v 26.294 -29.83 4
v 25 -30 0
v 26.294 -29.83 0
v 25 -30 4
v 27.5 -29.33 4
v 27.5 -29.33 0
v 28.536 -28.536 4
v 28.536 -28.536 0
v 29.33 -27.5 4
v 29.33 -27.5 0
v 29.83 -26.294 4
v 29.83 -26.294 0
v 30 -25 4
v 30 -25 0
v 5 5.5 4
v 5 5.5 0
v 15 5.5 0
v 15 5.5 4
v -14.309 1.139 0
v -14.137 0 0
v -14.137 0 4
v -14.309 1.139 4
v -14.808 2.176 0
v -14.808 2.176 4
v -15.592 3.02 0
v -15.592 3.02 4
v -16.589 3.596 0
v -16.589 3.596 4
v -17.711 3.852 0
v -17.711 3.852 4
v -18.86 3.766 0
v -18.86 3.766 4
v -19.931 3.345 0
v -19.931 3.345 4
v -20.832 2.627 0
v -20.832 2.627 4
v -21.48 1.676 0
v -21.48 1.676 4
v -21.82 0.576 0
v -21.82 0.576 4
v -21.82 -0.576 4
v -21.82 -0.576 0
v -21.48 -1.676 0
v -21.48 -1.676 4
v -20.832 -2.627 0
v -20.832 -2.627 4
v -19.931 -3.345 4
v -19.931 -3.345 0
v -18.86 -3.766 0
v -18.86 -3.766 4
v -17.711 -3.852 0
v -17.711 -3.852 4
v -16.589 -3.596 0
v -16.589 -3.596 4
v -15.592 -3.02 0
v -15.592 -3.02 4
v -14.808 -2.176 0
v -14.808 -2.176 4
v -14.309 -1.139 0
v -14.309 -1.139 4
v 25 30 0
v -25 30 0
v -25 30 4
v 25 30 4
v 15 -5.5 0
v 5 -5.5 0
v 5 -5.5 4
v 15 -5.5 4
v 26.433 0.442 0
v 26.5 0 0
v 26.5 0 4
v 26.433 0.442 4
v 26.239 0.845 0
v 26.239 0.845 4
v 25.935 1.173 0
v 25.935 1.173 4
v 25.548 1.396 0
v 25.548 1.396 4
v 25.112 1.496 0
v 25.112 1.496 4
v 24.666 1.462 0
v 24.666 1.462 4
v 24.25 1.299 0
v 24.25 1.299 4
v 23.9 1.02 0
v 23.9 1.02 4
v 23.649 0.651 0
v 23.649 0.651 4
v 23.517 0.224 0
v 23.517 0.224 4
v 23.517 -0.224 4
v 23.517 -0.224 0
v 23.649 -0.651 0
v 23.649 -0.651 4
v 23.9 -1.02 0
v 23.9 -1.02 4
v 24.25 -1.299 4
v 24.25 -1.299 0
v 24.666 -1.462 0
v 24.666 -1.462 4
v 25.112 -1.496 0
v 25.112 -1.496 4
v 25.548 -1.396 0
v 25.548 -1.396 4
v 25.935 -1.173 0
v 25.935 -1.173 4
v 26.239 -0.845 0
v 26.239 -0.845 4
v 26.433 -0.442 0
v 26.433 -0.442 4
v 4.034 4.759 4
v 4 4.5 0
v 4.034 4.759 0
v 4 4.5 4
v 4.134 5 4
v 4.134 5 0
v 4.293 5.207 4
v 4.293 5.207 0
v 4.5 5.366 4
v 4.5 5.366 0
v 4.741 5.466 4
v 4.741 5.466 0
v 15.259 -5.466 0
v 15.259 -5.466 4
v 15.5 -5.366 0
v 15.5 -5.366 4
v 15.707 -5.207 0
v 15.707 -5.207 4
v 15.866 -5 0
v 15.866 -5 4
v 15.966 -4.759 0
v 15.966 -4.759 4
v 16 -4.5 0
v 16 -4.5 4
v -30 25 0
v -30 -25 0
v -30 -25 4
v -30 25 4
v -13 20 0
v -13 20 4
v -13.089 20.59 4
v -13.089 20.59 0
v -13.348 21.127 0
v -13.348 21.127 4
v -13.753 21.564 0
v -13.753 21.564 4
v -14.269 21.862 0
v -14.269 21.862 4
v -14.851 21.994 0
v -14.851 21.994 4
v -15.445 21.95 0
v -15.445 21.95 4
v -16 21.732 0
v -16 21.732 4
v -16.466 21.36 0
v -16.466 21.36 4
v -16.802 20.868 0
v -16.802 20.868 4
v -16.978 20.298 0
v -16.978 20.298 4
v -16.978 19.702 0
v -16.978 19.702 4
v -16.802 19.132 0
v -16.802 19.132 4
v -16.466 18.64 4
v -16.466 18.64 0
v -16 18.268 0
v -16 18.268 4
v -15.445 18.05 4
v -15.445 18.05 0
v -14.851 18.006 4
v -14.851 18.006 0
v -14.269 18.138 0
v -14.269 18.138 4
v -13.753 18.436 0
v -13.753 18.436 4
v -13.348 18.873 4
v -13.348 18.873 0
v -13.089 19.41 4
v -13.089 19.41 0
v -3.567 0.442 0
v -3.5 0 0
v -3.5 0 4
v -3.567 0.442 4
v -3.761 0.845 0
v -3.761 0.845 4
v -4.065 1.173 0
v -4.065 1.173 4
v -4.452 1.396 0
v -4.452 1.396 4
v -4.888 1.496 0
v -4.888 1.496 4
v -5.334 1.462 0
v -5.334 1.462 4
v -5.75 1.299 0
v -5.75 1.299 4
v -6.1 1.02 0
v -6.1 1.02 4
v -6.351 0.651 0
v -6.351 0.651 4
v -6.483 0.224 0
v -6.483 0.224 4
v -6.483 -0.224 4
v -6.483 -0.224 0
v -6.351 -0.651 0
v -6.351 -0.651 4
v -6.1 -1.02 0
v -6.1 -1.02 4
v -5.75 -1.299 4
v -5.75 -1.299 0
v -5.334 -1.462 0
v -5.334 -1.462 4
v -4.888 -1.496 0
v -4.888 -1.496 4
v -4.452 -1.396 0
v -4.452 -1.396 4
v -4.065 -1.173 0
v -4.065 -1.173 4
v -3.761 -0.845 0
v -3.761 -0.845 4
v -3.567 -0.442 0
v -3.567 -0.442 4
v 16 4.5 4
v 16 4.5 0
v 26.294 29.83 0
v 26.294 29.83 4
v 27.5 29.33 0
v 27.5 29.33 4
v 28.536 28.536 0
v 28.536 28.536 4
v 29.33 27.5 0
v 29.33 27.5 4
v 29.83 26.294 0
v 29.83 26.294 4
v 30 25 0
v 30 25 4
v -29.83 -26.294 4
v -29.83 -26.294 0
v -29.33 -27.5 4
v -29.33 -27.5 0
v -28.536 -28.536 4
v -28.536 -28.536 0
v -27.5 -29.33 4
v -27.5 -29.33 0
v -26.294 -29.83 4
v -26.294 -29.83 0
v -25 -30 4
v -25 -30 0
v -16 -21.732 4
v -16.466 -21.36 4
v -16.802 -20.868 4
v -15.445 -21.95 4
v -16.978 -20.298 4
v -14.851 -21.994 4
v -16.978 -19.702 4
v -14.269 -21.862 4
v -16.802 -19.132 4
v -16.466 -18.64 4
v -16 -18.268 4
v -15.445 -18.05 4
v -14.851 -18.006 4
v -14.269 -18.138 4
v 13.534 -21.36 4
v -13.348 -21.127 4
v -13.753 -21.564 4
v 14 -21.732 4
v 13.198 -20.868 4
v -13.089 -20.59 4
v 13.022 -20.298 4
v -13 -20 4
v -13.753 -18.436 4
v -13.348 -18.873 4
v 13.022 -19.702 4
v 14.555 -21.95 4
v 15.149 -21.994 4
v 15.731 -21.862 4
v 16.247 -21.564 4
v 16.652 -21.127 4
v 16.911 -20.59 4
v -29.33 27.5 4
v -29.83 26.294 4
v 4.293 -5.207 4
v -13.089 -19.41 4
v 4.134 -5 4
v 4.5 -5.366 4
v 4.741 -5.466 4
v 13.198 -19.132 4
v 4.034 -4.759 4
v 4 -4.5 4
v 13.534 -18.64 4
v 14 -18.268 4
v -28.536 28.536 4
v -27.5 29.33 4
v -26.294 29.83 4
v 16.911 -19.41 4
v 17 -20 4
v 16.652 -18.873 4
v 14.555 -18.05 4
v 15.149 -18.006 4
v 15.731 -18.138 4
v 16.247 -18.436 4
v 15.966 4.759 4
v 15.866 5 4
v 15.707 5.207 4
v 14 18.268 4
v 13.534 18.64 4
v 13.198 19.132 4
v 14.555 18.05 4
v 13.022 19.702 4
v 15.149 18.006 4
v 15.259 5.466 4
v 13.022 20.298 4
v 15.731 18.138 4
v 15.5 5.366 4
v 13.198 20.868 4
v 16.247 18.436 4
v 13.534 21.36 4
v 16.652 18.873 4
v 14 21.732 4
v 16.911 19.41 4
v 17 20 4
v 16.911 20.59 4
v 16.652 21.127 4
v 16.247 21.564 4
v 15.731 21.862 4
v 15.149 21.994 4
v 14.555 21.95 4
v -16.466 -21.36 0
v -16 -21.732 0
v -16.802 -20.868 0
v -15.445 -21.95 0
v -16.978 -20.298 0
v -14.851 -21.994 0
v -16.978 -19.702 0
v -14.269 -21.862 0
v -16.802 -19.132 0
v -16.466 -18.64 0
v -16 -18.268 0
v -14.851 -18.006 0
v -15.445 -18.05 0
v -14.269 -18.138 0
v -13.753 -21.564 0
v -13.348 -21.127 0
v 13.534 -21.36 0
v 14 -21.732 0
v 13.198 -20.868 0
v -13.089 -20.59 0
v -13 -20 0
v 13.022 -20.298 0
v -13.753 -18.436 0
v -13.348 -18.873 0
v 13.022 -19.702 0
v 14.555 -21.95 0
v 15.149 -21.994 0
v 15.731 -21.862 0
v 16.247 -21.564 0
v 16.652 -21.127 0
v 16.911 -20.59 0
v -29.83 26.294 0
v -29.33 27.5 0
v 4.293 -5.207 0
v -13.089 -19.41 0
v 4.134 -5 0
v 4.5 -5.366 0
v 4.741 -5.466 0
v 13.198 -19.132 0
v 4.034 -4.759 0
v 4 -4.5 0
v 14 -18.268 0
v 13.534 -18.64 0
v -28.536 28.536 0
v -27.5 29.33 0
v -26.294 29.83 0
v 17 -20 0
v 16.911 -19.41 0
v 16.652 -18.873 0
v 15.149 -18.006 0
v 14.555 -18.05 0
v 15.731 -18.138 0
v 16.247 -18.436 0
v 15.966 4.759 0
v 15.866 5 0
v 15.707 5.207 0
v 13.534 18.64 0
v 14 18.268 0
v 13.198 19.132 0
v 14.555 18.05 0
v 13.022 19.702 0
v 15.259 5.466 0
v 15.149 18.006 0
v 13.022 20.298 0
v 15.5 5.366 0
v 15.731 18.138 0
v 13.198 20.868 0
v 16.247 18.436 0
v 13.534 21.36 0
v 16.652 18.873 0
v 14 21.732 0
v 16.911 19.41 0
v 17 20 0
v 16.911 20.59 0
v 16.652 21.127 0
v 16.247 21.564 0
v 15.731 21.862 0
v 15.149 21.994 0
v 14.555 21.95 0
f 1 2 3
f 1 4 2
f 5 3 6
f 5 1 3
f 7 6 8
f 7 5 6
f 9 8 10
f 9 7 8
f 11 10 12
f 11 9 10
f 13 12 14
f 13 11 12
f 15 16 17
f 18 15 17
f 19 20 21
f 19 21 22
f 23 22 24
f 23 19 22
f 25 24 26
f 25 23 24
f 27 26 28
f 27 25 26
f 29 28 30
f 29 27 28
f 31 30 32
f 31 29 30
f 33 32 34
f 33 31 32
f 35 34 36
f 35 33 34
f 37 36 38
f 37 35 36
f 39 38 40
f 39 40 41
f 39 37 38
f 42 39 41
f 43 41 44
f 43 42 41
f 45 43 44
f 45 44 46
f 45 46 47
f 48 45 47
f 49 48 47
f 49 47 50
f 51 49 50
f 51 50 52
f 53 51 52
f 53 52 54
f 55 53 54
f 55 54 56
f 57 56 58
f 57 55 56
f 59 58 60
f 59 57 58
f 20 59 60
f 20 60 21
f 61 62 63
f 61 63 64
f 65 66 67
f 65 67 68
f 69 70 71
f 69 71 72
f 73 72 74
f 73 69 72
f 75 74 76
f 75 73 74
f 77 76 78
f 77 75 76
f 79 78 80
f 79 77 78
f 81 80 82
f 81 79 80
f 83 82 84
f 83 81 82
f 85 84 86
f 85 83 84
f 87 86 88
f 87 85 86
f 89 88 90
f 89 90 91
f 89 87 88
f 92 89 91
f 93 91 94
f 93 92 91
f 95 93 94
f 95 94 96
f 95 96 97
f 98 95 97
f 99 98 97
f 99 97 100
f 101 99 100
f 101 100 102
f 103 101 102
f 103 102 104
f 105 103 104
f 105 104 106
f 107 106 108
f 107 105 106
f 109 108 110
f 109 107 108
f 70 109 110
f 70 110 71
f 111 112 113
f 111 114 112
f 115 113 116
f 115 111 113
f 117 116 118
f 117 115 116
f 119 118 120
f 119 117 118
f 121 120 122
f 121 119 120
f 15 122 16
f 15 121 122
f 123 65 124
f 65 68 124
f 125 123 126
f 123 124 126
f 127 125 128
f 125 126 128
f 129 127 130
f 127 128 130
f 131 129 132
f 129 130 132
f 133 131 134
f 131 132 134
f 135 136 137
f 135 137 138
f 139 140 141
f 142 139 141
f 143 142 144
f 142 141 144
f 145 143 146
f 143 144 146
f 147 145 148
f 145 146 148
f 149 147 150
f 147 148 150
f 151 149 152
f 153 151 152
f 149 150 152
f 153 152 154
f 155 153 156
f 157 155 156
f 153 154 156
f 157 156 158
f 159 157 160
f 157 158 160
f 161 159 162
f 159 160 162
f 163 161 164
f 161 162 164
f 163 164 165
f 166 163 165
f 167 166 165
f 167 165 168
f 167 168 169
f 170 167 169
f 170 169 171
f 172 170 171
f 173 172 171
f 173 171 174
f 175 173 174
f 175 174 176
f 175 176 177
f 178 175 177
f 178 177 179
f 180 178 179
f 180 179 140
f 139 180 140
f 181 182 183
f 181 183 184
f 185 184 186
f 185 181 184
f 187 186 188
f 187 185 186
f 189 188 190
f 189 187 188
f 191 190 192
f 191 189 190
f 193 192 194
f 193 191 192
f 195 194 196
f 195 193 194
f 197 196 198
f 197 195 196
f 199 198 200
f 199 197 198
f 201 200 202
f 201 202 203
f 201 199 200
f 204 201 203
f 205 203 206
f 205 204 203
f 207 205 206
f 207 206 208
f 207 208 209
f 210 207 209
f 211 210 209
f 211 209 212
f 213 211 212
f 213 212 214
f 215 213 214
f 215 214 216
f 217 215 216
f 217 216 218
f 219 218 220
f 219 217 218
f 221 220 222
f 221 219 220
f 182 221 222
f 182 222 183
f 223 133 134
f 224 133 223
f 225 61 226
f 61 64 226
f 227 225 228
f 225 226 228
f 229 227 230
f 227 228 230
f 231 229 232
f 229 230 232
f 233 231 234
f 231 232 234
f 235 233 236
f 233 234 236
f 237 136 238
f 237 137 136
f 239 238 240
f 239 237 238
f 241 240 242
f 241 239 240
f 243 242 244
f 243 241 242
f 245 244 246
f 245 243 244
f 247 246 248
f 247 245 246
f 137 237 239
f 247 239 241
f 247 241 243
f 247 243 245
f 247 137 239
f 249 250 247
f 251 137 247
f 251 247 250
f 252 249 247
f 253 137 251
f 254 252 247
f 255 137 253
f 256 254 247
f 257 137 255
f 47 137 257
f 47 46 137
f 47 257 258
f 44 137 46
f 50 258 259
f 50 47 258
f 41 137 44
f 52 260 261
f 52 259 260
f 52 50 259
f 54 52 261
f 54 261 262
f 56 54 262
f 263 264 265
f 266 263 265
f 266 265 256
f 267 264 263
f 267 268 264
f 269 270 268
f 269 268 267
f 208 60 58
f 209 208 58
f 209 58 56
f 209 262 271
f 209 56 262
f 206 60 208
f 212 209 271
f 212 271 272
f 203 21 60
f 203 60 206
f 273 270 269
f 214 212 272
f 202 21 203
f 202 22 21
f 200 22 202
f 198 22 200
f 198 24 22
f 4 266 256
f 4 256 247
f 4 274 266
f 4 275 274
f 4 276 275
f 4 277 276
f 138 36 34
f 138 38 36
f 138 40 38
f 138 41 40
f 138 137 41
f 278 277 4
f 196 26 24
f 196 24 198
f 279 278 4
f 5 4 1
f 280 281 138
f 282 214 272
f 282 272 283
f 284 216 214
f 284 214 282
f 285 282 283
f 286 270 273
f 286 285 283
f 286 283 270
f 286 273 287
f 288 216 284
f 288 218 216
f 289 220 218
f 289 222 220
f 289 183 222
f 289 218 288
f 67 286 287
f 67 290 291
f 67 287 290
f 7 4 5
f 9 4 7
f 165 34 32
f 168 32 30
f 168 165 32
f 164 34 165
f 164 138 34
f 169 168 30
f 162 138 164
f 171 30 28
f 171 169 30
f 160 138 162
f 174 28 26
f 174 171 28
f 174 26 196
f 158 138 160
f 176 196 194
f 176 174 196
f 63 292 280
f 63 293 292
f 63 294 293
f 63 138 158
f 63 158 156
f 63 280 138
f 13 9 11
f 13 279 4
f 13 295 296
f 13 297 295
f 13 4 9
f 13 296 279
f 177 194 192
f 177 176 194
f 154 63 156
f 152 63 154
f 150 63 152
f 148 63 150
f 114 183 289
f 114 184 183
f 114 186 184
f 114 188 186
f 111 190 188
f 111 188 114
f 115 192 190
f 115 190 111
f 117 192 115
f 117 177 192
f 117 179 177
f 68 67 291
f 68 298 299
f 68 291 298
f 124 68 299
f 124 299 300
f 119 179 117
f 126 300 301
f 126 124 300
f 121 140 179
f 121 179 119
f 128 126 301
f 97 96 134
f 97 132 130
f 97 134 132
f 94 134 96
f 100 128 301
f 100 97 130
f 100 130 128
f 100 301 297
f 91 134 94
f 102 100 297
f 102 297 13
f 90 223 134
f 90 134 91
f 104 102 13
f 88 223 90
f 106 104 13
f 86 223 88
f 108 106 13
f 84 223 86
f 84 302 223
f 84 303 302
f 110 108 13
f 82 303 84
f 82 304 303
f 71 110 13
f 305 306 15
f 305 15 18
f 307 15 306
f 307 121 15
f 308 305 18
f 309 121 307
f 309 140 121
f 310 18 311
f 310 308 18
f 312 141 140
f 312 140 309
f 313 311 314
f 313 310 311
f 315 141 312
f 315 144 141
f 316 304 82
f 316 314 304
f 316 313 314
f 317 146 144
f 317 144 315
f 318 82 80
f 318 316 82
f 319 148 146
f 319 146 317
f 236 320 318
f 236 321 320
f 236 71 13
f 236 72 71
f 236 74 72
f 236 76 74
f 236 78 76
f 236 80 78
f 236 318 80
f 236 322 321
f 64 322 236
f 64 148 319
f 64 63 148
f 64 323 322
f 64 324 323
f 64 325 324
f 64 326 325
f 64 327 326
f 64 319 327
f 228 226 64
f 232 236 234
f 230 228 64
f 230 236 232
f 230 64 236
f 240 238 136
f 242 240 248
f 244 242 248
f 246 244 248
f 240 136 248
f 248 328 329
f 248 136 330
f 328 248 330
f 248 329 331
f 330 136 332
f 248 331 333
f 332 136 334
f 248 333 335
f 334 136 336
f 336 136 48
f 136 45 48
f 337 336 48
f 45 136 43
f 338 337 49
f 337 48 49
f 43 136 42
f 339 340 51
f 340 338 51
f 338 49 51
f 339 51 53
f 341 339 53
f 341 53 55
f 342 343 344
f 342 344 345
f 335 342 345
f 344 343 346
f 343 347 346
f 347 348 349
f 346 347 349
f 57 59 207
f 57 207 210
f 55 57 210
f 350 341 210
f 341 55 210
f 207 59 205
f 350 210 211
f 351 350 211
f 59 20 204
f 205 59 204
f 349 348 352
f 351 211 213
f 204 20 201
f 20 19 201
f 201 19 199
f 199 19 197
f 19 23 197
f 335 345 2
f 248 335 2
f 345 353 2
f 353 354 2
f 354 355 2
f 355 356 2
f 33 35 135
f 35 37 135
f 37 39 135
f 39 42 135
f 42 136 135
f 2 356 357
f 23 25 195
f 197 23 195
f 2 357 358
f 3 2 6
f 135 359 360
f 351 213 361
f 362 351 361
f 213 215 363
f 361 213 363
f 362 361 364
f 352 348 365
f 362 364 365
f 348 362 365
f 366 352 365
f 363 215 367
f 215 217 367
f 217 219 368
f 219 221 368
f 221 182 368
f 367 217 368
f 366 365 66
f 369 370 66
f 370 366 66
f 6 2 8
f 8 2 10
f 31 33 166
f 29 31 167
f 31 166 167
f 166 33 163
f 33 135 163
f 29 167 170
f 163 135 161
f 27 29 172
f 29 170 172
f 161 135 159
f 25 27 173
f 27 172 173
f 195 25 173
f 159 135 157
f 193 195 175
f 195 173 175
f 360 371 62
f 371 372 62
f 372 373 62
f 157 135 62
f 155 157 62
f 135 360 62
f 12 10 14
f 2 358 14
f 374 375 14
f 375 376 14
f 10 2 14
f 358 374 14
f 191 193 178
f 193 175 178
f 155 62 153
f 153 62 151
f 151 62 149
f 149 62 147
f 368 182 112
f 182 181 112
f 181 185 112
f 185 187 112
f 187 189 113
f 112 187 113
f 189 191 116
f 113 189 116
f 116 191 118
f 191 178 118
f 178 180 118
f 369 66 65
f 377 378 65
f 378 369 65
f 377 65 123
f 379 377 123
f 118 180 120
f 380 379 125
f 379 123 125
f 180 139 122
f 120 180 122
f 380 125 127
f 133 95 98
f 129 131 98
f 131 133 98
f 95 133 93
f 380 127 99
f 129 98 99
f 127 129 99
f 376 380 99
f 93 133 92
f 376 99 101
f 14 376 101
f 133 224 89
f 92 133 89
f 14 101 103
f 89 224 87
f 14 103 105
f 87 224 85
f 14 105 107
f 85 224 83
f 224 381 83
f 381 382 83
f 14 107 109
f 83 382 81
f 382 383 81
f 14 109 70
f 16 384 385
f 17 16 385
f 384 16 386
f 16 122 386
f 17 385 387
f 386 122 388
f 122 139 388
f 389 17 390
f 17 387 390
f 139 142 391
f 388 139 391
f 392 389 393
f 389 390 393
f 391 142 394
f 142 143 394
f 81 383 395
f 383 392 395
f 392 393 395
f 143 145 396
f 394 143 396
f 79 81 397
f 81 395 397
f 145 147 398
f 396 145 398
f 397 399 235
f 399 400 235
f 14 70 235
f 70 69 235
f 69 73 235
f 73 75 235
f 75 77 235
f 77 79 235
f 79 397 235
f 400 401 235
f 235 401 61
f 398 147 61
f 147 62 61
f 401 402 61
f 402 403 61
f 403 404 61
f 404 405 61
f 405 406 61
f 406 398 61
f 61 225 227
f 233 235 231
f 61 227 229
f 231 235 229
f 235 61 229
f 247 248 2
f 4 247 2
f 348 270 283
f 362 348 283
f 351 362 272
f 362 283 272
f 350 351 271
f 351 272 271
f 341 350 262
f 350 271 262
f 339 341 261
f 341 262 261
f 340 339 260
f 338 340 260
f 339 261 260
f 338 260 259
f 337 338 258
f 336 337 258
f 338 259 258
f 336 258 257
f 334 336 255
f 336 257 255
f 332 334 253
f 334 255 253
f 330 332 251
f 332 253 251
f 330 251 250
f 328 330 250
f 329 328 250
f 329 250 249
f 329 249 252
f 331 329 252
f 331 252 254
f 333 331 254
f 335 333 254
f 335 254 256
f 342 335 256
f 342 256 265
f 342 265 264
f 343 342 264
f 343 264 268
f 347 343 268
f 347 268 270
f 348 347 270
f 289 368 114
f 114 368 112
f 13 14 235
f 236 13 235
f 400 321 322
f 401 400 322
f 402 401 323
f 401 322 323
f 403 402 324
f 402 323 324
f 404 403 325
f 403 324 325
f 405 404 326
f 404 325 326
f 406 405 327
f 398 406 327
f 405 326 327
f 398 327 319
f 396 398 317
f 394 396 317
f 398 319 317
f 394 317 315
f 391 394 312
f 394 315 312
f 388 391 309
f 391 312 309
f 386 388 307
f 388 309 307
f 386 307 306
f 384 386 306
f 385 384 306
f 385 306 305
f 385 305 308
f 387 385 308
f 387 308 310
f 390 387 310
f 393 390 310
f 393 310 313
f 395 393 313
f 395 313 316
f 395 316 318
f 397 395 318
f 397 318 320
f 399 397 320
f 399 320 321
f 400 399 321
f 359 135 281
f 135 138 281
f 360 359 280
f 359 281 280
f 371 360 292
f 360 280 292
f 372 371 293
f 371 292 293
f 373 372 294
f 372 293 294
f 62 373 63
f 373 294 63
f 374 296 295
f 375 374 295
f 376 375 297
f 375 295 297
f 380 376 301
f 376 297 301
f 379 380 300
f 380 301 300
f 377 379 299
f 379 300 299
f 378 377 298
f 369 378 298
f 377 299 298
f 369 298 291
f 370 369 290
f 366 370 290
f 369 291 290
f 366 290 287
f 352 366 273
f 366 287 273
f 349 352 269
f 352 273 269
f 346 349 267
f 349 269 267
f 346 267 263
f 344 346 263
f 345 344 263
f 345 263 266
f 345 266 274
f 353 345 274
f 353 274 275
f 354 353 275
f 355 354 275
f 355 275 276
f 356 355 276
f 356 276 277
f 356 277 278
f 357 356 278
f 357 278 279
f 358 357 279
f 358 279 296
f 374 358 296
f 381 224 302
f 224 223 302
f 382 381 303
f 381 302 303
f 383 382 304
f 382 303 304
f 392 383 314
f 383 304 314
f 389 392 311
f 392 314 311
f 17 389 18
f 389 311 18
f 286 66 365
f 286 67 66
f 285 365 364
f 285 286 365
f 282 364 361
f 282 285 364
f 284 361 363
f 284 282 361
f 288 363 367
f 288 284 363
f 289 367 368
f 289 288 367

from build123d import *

# Parameters (mm, degrees)
F0_W     = 60
F0_H     = 60
F0_R     = 3.862791
F0_R_2   = 1.5
F0_W_2   = 12
F0_H_2   = 11
F1_DEPTH = 4
F2_R     = 2
F3_DEPTH = 25
F4_R     = 5
F5_R     = 1


with BuildPart() as f1:
    # F0 (on Top) → F1 (new body)
    with BuildSketch(Plane.XY):
        Rectangle(F0_W, F0_H)
        with Locations((-18, 0)):
            Circle(F0_R, mode=Mode.SUBTRACT)
        with Locations((-5, 0)):
            Circle(F0_R_2, mode=Mode.SUBTRACT)
        with Locations((10, 0)):
            Rectangle(F0_W_2, F0_H_2, mode=Mode.SUBTRACT)
        with Locations((25, 0)):
            Circle(F0_R_2, mode=Mode.SUBTRACT)
    extrude(amount=F1_DEPTH)

    # F2 (on face) → F3 (cut)
    with BuildSketch(Plane.XY.offset(4)):
        with Locations((-15, 20)):
            Circle(F2_R)
        with Locations((15, 20)):
            Circle(F2_R)
        with Locations((15, -20)):
            Circle(F2_R)
        with Locations((-15, -20)):
            Circle(F2_R)
    extrude(amount=-F3_DEPTH, mode=Mode.SUBTRACT)

    # F4
    f4_edges = [f1.edges().sort_by_distance(p)[0] for p in [
        (-30, 30, 2),
        (-30, -30, 2),
        (30, -30, 2),
        (30, 30, 2),
    ]]
    fillet(f4_edges, radius=F4_R)

    # F5
    f5_edges = [f1.edges().sort_by_distance(p)[0] for p in [
        (4, 5.5, 2),
        (16, 5.5, 2),
        (16, -5.5, 2),
        (4, -5.5, 2),
    ]]
    fillet(f5_edges, radius=F5_R)


solid = f1.part
